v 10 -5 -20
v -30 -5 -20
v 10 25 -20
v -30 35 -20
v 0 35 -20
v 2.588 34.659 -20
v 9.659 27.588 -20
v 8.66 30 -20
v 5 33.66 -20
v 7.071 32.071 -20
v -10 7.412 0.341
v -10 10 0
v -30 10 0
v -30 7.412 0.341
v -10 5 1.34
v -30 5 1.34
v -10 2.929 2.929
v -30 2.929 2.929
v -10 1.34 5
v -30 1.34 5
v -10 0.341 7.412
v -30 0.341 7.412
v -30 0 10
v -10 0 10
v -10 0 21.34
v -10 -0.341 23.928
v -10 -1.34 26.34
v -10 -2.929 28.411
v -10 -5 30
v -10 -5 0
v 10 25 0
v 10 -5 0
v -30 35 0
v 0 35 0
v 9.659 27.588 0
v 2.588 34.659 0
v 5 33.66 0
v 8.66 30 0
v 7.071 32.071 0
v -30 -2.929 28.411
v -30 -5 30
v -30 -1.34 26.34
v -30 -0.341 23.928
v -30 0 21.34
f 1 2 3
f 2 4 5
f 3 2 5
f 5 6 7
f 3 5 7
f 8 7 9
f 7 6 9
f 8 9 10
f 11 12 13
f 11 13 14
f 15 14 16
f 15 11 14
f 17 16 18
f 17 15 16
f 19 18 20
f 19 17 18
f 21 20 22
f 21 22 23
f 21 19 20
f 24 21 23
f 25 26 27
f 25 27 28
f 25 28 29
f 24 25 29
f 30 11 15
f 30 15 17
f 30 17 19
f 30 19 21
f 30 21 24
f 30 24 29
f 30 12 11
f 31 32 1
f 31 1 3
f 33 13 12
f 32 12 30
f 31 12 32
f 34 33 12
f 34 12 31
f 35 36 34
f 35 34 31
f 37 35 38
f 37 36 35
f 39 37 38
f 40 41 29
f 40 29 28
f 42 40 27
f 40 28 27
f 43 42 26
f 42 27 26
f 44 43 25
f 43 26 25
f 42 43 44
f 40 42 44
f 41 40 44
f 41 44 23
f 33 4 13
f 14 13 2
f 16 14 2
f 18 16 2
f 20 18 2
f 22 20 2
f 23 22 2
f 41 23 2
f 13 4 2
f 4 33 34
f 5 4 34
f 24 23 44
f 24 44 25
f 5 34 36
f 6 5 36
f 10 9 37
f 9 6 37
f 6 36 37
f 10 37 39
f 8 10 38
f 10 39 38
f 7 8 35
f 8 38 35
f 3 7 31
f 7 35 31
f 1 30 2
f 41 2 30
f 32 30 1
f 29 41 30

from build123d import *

# Parameters (mm, degrees)
SKETCH1_W           = 20
SKETCH1_H           = 5
BOSS_EXTRUDE1_DEPTH = 30
SKETCH2_W           = 40
SKETCH2_H           = 40
BOSS_EXTRUDE2_DEPTH = 20
FILLET1_R           = 10


with BuildPart() as part:
    # Sketch1 → Boss-Extrude1 (new body)
    with BuildSketch(Plane.XY):
        with Locations((-20, -2.5)):
            Rectangle(SKETCH1_W, SKETCH1_H)
    extrude(amount=BOSS_EXTRUDE1_DEPTH)

    # Sketch2 → Boss-Extrude2 (add)
    with BuildSketch(Plane.XY):
        with Locations((-10, 15)):
            Rectangle(SKETCH2_W, SKETCH2_H)
    extrude(amount=-BOSS_EXTRUDE2_DEPTH)

    # Fillet1
    # the kernel refuses this fillet: 10 mm, written as the material it adds along each edge
    with BuildSketch(Plane(origin=(-10, 0, 0), x_dir=(0, 1, 0), z_dir=(-1, 0, 0))) as fillet1_piece_1:
        with BuildLine():
            CenterArc((FILLET1_R, -FILLET1_R), FILLET1_R, 90, 90)
            Line((0, -FILLET1_R), (0, 0))
            Line((0, 0), (FILLET1_R, 0))
        make_face()
    extrude(amount=20)
    # the kernel refuses this fillet: 10 mm, written as the material it takes off along each edge
    with BuildSketch(Plane(origin=(10, 35, 25), x_dir=(-1, 0, 0), z_dir=(0, 0, -1))) as fillet1_2_piece_1:
        with BuildLine():
            CenterArc((FILLET1_R, -FILLET1_R), FILLET1_R, 90, 90)
            Line((0, -FILLET1_R), (0, 0))
            Line((0, 0), (FILLET1_R, 0))
        make_face()
    extrude(amount=70, mode=Mode.SUBTRACT)
    with BuildSketch(Plane(origin=(11.650635095, 0, 30), x_dir=(0, 0, -1), z_dir=(-1, 0, 0))) as fillet1_2_piece_2:
        with BuildLine():
            CenterArc((8.660254038, 10), FILLET1_R, 210, 60)
            Line((0, 5), (0, 0))
            Line((0, 0), (8.660254038, 0))
        make_face()
    extrude(amount=63.301270189, mode=Mode.SUBTRACT)


solid = part.part
